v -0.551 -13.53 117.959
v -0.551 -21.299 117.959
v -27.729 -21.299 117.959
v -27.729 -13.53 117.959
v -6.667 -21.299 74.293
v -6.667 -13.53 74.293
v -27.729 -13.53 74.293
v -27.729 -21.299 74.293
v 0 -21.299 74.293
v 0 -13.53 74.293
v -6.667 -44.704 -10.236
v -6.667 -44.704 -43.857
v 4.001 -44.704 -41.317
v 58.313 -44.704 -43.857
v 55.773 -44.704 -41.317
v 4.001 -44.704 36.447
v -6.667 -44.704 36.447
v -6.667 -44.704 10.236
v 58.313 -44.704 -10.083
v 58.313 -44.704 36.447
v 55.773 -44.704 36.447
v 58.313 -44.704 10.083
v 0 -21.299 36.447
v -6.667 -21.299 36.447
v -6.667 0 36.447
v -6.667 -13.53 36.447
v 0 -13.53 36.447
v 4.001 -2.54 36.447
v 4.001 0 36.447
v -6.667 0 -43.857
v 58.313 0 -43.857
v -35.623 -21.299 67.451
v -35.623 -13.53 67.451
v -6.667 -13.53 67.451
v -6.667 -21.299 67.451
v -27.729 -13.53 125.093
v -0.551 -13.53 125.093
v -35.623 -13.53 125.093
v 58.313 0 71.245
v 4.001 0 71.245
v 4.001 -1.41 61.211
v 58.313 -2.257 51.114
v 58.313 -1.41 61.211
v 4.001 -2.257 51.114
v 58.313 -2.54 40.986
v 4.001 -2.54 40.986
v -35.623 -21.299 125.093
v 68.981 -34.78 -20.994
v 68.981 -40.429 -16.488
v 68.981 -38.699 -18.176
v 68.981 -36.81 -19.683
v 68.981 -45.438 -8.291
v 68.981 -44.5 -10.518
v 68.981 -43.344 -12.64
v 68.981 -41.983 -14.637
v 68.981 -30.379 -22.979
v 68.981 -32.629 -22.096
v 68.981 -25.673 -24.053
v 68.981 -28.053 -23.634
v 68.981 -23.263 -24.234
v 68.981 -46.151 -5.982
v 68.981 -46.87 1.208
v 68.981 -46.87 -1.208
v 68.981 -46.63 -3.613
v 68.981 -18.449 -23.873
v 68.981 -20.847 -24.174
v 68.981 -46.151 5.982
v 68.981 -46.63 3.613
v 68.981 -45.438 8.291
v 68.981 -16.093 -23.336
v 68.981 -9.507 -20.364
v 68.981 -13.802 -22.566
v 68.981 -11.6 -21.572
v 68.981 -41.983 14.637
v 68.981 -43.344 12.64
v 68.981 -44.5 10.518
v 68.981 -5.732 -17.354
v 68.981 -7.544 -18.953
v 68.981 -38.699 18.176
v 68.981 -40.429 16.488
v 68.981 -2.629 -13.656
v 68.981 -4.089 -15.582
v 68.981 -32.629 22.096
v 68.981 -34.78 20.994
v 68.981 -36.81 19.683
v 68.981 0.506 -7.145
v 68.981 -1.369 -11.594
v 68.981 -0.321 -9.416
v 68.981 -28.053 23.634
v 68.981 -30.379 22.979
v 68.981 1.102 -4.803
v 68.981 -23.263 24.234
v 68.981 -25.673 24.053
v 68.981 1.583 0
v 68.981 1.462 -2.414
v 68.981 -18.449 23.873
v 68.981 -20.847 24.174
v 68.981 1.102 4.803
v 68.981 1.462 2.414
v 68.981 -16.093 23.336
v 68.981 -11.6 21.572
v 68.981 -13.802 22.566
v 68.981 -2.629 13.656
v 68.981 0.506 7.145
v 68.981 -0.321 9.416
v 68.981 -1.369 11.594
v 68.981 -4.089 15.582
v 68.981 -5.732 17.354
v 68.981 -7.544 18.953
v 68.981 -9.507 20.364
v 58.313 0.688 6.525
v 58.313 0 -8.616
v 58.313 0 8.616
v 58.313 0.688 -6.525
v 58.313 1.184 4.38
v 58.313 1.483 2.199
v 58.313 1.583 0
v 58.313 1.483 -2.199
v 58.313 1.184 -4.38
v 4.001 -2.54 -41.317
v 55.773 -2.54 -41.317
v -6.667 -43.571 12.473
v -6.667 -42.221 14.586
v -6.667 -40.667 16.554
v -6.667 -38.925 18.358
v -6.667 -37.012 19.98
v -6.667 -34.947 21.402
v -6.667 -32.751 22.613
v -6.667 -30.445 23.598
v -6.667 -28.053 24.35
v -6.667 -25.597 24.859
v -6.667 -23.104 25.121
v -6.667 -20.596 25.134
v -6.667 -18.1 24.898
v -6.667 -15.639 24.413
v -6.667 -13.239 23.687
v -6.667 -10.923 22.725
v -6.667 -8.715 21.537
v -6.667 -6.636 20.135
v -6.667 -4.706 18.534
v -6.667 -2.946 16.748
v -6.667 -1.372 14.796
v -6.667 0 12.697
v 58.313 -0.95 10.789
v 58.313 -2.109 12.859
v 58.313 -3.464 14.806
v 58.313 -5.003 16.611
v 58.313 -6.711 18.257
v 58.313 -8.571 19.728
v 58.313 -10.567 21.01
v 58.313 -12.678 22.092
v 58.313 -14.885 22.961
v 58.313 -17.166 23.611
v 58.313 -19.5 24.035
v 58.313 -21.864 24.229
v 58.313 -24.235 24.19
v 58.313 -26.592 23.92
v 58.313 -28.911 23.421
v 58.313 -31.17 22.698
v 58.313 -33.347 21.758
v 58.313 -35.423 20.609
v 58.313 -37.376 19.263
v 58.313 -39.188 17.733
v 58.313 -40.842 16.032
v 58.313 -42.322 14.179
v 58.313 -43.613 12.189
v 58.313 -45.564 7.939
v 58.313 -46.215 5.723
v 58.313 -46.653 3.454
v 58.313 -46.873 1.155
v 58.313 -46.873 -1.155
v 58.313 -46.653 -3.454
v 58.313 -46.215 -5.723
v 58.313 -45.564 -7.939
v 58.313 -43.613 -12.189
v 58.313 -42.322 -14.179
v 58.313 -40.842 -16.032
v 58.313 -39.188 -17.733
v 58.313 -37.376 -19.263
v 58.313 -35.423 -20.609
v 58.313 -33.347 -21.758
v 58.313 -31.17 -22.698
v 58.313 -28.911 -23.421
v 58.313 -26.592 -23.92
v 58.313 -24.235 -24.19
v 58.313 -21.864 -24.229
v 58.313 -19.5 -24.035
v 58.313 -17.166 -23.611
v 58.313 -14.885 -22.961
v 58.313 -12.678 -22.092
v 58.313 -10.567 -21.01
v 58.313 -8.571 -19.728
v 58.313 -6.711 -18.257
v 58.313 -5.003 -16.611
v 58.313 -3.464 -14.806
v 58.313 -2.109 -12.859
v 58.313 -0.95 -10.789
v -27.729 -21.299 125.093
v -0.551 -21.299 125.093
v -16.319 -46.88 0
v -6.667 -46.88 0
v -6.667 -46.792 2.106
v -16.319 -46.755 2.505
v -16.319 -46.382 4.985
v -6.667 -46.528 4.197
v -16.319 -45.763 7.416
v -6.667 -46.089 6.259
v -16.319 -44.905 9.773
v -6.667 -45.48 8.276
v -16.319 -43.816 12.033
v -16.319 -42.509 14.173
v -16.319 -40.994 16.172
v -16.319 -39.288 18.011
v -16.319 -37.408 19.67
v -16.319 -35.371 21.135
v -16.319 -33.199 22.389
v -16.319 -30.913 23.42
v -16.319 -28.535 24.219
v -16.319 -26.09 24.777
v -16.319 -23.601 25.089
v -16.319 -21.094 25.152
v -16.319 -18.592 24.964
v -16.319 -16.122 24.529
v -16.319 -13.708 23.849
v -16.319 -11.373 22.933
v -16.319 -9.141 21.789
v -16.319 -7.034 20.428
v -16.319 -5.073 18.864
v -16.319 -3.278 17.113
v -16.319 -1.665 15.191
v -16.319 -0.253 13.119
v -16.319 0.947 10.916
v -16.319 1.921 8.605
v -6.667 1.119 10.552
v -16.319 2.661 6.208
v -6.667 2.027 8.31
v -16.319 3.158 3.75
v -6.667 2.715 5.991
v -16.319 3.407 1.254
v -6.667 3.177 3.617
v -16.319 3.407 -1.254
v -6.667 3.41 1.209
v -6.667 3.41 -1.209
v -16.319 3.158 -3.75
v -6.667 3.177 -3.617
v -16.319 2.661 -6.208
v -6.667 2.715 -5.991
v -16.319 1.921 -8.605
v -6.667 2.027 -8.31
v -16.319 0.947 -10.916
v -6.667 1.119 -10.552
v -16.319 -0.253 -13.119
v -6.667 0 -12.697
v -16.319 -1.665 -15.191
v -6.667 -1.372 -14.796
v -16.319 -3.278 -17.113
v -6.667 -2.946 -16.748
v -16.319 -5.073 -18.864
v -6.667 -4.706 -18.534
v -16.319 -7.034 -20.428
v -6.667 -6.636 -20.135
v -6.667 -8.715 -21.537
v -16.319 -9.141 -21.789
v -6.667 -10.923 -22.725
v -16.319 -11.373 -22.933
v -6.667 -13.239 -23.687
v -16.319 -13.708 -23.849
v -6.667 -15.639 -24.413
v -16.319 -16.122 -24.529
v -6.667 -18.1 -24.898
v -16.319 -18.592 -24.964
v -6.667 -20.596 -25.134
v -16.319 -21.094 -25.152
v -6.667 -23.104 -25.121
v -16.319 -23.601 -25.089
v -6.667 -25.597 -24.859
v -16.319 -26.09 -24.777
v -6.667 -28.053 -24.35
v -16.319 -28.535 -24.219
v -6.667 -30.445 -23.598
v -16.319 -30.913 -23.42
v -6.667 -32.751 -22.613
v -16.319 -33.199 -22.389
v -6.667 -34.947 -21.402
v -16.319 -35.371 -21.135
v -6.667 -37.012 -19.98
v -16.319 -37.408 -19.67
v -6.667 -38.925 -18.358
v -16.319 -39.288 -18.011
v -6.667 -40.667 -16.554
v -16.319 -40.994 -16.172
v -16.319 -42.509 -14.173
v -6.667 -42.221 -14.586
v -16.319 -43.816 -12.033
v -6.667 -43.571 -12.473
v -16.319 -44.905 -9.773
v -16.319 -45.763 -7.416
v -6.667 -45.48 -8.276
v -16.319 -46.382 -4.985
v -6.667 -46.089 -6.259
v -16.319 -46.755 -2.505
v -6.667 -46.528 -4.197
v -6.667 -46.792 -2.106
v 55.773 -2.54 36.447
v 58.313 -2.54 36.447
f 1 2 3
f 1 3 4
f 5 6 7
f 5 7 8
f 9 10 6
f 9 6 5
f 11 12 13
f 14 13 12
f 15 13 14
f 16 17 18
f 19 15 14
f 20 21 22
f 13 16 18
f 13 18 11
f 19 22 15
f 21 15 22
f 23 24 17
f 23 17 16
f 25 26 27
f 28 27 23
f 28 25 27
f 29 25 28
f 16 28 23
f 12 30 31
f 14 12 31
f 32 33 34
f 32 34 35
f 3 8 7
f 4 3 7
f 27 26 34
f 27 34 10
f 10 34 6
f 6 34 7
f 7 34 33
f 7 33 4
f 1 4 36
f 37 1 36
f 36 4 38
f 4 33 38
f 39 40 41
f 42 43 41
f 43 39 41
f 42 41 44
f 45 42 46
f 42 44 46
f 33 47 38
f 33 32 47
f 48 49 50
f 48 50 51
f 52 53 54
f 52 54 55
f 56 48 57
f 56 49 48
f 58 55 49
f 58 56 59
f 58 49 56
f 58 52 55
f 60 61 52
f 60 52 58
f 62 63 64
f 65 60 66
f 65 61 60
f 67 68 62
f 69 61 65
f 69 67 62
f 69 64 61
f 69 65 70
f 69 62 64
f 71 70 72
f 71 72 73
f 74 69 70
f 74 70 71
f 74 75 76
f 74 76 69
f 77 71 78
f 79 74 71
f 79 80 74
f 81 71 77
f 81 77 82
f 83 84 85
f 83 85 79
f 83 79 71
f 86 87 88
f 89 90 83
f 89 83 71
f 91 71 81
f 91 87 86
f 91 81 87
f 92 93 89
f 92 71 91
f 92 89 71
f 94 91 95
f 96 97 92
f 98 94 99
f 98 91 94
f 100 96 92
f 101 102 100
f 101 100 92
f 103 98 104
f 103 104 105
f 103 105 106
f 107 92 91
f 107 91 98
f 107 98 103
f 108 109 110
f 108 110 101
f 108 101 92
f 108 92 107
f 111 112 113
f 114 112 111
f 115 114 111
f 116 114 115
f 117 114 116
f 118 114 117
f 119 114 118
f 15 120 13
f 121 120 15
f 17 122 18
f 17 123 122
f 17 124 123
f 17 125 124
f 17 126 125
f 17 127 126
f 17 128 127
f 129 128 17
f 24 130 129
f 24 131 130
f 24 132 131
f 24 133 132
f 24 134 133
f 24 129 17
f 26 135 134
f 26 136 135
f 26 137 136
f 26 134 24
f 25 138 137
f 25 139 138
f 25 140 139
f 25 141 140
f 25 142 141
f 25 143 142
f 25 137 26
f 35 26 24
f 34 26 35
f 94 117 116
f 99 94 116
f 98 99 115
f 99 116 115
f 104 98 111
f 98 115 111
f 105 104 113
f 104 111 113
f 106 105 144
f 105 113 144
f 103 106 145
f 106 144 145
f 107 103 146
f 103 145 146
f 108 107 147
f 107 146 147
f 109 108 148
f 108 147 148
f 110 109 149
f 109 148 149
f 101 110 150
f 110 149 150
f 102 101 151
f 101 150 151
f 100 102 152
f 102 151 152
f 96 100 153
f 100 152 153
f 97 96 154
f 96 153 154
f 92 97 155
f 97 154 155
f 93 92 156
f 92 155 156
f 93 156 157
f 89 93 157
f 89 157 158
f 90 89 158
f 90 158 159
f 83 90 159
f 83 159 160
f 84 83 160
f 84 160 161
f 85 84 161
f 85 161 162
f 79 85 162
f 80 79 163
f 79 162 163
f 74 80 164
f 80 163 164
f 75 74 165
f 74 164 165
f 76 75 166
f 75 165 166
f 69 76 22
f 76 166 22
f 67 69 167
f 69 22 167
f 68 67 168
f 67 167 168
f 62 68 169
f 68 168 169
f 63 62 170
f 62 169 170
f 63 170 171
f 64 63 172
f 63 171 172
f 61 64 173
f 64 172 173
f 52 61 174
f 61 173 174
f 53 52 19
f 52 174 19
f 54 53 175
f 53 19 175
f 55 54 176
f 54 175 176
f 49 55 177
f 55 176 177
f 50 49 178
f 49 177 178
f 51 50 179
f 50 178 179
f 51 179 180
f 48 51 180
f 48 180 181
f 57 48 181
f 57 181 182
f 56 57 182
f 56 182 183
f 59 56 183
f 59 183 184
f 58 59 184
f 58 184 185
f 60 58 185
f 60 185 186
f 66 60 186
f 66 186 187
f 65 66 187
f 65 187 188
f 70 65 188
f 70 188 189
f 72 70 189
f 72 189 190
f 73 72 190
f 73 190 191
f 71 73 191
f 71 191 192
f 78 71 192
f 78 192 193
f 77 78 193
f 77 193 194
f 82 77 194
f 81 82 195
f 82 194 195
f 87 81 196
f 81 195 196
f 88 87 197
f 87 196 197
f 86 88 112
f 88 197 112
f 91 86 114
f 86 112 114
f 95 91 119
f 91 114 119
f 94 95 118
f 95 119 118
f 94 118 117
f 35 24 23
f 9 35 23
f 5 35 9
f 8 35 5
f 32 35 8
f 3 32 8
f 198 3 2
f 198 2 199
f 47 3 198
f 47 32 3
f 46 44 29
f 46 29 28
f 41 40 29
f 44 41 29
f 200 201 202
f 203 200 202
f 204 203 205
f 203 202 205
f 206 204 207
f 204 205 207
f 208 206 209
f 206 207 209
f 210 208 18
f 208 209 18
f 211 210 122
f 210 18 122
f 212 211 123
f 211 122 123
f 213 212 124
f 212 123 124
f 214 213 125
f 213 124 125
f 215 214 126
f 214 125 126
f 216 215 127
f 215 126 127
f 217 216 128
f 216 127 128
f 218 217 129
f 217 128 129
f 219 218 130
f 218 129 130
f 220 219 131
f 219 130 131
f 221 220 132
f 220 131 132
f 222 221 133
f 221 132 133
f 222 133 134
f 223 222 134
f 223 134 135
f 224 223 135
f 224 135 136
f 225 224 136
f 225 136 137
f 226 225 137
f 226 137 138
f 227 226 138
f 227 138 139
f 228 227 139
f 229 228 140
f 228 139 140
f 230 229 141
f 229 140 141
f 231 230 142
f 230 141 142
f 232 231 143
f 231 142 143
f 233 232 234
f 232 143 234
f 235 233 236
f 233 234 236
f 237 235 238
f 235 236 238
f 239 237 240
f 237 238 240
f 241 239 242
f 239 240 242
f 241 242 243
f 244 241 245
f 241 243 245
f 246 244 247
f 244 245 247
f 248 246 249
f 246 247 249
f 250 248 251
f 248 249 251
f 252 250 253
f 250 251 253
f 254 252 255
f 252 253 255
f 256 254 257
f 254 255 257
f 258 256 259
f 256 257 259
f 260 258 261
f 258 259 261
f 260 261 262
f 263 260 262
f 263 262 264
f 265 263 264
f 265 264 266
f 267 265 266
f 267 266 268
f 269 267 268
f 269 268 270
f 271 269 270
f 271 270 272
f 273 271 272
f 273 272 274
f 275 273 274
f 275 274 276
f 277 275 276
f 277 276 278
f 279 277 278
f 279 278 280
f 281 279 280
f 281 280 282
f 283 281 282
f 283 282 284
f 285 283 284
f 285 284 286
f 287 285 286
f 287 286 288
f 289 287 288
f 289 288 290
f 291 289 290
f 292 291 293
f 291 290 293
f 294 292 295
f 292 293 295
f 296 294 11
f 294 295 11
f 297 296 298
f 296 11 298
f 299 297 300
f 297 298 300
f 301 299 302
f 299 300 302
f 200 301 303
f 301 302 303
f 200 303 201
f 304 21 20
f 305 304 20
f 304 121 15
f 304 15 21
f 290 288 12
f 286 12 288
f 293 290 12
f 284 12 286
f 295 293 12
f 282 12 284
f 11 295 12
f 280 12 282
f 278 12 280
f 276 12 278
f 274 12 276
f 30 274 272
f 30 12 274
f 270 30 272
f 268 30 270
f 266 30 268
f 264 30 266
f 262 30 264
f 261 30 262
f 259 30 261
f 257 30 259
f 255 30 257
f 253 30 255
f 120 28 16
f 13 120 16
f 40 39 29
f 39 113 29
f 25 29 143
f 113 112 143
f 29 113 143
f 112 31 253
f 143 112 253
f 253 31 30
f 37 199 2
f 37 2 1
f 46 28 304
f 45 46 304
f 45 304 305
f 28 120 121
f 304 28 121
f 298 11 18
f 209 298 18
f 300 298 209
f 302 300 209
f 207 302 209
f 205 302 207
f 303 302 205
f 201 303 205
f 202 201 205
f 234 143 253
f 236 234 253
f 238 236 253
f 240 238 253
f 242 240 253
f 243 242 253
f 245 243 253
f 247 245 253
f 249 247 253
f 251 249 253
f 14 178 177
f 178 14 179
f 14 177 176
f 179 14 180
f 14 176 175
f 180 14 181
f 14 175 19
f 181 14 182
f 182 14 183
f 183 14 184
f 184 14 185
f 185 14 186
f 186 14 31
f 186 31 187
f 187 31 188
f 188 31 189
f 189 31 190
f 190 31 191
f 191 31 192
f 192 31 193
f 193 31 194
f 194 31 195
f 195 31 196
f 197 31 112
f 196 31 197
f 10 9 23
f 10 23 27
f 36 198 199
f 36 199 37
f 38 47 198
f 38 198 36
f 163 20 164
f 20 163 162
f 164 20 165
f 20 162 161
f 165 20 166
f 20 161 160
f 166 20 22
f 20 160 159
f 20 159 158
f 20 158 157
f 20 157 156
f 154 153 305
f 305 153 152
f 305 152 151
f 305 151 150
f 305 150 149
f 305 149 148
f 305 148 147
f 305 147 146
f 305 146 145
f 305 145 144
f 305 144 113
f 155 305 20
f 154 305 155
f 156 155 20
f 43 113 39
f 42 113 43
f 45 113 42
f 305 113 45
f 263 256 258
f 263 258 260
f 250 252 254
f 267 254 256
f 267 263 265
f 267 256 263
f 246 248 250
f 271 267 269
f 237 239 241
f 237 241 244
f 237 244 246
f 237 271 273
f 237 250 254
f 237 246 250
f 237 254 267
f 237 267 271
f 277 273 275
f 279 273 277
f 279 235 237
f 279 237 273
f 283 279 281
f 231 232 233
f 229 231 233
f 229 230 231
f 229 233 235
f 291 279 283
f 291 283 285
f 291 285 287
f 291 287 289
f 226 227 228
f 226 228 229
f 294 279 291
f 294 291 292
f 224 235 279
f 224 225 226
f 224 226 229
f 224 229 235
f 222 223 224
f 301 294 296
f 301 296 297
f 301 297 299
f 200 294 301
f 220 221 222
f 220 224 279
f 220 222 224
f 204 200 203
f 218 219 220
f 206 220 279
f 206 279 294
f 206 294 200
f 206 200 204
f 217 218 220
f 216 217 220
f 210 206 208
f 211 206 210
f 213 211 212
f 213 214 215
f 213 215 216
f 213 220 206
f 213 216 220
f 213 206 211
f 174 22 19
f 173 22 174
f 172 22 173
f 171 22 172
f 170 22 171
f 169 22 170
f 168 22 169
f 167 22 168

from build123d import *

# Parameters (mm, degrees)
F0_W         = 64.9794517085
F0_H         = 80.3038775921
F1_DEPTH     = 44.704
F2_T         = -2.54
F3_R         = 24.241575959
F1_FACE1_W   = 44.704
F1_FACE1_H   = 80.3038775921
F4_DEPTH     = 10.668
F5_R         = 25.1594880742
F6_DEPTH     = 9.652
F7_W         = 6.6666891798
F7_H         = 7.7688368037
F8_DEPTH     = 37.846
F9_W         = 7.7688368037
F9_H         = 6.8424391291
F10_DEPTH    = 28.956
F11_W        = 7.8935802502
F11_H        = 7.7688368037
F12_DEPTH    = 25.4
F13_DEPTH    = 25.4
F15_DEPTH    = 34.798
F16_T1_DEPTH = 205.6075505485
F17_W        = 7.7688368037
F17_H        = 7.1335003994
F18_DEPTH    = 27.178


# Not quite as in the source:
# - a fillet or chamfer that OpenCascade refuses, or shapes differently, is made with other operations: its cross-section is extruded or revolved along the edge and cut away or added


with BuildPart() as f1:
    # F0 (on Front) → F1 (new body)
    with BuildSketch(Plane.XZ):
        with Locations((25.8230366744, -3.7049613893)):
            Rectangle(F0_W, F0_H)
    extrude(amount=F1_DEPTH)

    # F2
    f2_openings = [f1.faces().sort_by_distance(p)[0] for p in [
        (25.823037, -22.352, 36.446977),
        (25.823037, -44.704, -3.704961),
    ]]
    offset(amount=F2_T, openings=f2_openings)

    # F3 (on face) + F1_face1 (on face) → F4 (join)
    with BuildSketch(Plane.YZ.offset(58.3127625287)):
        with Locations((-22.6588118821, 0)):
            Circle(F3_R)
    with BuildSketch(Plane(origin=(-6.6666891798, -22.352, -3.7049613893), x_dir=(0, -1, 0), z_dir=(-1, 0, 0))):
        Rectangle(F1_FACE1_W, F1_FACE1_H)
    extrude(amount=F4_DEPTH, dir=(1, 0, 0))

    # F5 (on face) → F6 (join)
    with BuildSketch(Plane(origin=(-6.6666891798, 0, 0), x_dir=(0, -1, 0), z_dir=(-1, 0, 0))):
        with Locations((21.7208880931, 0)):
            Circle(F5_R)
    extrude(amount=F6_DEPTH)

    # F7 (on face) → F8 (join)
    with BuildSketch(Plane.XY.offset(36.4469774067)):
        with Locations((-3.3333445899, -17.414805945)):
            Rectangle(F7_W, F7_H)
    extrude(amount=F8_DEPTH)

    # F9 (on face) → F10 (join)
    with BuildSketch(Plane(origin=(-6.6666891798, 0, 0), x_dir=(0, -1, 0), z_dir=(-1, 0, 0))):
        with Locations((17.414805945, 70.8717578422)):
            Rectangle(F9_W, F9_H)
    extrude(amount=F10_DEPTH)

    # F11 (on face) → F12 (join)
    with BuildSketch(Plane.XY.offset(74.2929774067)):
        with Locations((-31.6758990547, -17.414805945)):
            Rectangle(F11_W, F11_H)
    extrude(amount=F12_DEPTH)

    # F13 (add): a face of the model
    f13_faces = [f1.faces().sort_by_distance(p)[0] for p in [
        (-31.6758990547, -17.414805945, 99.6929774067),
    ]]
    extrude(f13_faces, amount=F13_DEPTH)

    # F14 (on face) → F15 (join)
    with BuildSketch(Plane.XY.offset(36.4469774067)):
        Polygon((58.3127625287, -2.54), (58.3127625287, 0), (4.0013108202, 0), (4.0013108202, -2.54), (55.7727625287, -2.54), align=None)
    extrude(amount=F15_DEPTH)

    # F16: fillet of radius 181.5102324735 on 1 edges, made by hand

    # F16_s2 → F16_t1 (cut)
    with BuildSketch(Plane.YZ.offset(-71.6467385999)):
        with BuildLine():
            ThreePointArc((0, 71.2449774067), (-1.903885347, 56.1685767196), (-2.54, 40.9857576387))
            Line((-2.54, 40.9857576387), (-2.54, 71.2449774067))
            Line((-2.54, 71.2449774067), (0, 71.2449774067))
        make_face()
    extrude(amount=F16_T1_DEPTH, mode=Mode.SUBTRACT)

    # F17 (on face) → F18 (join)
    with BuildSketch(Plane.YZ.offset(-27.7291089296)):
        with Locations((-17.414805945, 121.5262272071)):
            Rectangle(F17_W, F17_H)
    extrude(amount=F18_DEPTH)


solid = f1.part
